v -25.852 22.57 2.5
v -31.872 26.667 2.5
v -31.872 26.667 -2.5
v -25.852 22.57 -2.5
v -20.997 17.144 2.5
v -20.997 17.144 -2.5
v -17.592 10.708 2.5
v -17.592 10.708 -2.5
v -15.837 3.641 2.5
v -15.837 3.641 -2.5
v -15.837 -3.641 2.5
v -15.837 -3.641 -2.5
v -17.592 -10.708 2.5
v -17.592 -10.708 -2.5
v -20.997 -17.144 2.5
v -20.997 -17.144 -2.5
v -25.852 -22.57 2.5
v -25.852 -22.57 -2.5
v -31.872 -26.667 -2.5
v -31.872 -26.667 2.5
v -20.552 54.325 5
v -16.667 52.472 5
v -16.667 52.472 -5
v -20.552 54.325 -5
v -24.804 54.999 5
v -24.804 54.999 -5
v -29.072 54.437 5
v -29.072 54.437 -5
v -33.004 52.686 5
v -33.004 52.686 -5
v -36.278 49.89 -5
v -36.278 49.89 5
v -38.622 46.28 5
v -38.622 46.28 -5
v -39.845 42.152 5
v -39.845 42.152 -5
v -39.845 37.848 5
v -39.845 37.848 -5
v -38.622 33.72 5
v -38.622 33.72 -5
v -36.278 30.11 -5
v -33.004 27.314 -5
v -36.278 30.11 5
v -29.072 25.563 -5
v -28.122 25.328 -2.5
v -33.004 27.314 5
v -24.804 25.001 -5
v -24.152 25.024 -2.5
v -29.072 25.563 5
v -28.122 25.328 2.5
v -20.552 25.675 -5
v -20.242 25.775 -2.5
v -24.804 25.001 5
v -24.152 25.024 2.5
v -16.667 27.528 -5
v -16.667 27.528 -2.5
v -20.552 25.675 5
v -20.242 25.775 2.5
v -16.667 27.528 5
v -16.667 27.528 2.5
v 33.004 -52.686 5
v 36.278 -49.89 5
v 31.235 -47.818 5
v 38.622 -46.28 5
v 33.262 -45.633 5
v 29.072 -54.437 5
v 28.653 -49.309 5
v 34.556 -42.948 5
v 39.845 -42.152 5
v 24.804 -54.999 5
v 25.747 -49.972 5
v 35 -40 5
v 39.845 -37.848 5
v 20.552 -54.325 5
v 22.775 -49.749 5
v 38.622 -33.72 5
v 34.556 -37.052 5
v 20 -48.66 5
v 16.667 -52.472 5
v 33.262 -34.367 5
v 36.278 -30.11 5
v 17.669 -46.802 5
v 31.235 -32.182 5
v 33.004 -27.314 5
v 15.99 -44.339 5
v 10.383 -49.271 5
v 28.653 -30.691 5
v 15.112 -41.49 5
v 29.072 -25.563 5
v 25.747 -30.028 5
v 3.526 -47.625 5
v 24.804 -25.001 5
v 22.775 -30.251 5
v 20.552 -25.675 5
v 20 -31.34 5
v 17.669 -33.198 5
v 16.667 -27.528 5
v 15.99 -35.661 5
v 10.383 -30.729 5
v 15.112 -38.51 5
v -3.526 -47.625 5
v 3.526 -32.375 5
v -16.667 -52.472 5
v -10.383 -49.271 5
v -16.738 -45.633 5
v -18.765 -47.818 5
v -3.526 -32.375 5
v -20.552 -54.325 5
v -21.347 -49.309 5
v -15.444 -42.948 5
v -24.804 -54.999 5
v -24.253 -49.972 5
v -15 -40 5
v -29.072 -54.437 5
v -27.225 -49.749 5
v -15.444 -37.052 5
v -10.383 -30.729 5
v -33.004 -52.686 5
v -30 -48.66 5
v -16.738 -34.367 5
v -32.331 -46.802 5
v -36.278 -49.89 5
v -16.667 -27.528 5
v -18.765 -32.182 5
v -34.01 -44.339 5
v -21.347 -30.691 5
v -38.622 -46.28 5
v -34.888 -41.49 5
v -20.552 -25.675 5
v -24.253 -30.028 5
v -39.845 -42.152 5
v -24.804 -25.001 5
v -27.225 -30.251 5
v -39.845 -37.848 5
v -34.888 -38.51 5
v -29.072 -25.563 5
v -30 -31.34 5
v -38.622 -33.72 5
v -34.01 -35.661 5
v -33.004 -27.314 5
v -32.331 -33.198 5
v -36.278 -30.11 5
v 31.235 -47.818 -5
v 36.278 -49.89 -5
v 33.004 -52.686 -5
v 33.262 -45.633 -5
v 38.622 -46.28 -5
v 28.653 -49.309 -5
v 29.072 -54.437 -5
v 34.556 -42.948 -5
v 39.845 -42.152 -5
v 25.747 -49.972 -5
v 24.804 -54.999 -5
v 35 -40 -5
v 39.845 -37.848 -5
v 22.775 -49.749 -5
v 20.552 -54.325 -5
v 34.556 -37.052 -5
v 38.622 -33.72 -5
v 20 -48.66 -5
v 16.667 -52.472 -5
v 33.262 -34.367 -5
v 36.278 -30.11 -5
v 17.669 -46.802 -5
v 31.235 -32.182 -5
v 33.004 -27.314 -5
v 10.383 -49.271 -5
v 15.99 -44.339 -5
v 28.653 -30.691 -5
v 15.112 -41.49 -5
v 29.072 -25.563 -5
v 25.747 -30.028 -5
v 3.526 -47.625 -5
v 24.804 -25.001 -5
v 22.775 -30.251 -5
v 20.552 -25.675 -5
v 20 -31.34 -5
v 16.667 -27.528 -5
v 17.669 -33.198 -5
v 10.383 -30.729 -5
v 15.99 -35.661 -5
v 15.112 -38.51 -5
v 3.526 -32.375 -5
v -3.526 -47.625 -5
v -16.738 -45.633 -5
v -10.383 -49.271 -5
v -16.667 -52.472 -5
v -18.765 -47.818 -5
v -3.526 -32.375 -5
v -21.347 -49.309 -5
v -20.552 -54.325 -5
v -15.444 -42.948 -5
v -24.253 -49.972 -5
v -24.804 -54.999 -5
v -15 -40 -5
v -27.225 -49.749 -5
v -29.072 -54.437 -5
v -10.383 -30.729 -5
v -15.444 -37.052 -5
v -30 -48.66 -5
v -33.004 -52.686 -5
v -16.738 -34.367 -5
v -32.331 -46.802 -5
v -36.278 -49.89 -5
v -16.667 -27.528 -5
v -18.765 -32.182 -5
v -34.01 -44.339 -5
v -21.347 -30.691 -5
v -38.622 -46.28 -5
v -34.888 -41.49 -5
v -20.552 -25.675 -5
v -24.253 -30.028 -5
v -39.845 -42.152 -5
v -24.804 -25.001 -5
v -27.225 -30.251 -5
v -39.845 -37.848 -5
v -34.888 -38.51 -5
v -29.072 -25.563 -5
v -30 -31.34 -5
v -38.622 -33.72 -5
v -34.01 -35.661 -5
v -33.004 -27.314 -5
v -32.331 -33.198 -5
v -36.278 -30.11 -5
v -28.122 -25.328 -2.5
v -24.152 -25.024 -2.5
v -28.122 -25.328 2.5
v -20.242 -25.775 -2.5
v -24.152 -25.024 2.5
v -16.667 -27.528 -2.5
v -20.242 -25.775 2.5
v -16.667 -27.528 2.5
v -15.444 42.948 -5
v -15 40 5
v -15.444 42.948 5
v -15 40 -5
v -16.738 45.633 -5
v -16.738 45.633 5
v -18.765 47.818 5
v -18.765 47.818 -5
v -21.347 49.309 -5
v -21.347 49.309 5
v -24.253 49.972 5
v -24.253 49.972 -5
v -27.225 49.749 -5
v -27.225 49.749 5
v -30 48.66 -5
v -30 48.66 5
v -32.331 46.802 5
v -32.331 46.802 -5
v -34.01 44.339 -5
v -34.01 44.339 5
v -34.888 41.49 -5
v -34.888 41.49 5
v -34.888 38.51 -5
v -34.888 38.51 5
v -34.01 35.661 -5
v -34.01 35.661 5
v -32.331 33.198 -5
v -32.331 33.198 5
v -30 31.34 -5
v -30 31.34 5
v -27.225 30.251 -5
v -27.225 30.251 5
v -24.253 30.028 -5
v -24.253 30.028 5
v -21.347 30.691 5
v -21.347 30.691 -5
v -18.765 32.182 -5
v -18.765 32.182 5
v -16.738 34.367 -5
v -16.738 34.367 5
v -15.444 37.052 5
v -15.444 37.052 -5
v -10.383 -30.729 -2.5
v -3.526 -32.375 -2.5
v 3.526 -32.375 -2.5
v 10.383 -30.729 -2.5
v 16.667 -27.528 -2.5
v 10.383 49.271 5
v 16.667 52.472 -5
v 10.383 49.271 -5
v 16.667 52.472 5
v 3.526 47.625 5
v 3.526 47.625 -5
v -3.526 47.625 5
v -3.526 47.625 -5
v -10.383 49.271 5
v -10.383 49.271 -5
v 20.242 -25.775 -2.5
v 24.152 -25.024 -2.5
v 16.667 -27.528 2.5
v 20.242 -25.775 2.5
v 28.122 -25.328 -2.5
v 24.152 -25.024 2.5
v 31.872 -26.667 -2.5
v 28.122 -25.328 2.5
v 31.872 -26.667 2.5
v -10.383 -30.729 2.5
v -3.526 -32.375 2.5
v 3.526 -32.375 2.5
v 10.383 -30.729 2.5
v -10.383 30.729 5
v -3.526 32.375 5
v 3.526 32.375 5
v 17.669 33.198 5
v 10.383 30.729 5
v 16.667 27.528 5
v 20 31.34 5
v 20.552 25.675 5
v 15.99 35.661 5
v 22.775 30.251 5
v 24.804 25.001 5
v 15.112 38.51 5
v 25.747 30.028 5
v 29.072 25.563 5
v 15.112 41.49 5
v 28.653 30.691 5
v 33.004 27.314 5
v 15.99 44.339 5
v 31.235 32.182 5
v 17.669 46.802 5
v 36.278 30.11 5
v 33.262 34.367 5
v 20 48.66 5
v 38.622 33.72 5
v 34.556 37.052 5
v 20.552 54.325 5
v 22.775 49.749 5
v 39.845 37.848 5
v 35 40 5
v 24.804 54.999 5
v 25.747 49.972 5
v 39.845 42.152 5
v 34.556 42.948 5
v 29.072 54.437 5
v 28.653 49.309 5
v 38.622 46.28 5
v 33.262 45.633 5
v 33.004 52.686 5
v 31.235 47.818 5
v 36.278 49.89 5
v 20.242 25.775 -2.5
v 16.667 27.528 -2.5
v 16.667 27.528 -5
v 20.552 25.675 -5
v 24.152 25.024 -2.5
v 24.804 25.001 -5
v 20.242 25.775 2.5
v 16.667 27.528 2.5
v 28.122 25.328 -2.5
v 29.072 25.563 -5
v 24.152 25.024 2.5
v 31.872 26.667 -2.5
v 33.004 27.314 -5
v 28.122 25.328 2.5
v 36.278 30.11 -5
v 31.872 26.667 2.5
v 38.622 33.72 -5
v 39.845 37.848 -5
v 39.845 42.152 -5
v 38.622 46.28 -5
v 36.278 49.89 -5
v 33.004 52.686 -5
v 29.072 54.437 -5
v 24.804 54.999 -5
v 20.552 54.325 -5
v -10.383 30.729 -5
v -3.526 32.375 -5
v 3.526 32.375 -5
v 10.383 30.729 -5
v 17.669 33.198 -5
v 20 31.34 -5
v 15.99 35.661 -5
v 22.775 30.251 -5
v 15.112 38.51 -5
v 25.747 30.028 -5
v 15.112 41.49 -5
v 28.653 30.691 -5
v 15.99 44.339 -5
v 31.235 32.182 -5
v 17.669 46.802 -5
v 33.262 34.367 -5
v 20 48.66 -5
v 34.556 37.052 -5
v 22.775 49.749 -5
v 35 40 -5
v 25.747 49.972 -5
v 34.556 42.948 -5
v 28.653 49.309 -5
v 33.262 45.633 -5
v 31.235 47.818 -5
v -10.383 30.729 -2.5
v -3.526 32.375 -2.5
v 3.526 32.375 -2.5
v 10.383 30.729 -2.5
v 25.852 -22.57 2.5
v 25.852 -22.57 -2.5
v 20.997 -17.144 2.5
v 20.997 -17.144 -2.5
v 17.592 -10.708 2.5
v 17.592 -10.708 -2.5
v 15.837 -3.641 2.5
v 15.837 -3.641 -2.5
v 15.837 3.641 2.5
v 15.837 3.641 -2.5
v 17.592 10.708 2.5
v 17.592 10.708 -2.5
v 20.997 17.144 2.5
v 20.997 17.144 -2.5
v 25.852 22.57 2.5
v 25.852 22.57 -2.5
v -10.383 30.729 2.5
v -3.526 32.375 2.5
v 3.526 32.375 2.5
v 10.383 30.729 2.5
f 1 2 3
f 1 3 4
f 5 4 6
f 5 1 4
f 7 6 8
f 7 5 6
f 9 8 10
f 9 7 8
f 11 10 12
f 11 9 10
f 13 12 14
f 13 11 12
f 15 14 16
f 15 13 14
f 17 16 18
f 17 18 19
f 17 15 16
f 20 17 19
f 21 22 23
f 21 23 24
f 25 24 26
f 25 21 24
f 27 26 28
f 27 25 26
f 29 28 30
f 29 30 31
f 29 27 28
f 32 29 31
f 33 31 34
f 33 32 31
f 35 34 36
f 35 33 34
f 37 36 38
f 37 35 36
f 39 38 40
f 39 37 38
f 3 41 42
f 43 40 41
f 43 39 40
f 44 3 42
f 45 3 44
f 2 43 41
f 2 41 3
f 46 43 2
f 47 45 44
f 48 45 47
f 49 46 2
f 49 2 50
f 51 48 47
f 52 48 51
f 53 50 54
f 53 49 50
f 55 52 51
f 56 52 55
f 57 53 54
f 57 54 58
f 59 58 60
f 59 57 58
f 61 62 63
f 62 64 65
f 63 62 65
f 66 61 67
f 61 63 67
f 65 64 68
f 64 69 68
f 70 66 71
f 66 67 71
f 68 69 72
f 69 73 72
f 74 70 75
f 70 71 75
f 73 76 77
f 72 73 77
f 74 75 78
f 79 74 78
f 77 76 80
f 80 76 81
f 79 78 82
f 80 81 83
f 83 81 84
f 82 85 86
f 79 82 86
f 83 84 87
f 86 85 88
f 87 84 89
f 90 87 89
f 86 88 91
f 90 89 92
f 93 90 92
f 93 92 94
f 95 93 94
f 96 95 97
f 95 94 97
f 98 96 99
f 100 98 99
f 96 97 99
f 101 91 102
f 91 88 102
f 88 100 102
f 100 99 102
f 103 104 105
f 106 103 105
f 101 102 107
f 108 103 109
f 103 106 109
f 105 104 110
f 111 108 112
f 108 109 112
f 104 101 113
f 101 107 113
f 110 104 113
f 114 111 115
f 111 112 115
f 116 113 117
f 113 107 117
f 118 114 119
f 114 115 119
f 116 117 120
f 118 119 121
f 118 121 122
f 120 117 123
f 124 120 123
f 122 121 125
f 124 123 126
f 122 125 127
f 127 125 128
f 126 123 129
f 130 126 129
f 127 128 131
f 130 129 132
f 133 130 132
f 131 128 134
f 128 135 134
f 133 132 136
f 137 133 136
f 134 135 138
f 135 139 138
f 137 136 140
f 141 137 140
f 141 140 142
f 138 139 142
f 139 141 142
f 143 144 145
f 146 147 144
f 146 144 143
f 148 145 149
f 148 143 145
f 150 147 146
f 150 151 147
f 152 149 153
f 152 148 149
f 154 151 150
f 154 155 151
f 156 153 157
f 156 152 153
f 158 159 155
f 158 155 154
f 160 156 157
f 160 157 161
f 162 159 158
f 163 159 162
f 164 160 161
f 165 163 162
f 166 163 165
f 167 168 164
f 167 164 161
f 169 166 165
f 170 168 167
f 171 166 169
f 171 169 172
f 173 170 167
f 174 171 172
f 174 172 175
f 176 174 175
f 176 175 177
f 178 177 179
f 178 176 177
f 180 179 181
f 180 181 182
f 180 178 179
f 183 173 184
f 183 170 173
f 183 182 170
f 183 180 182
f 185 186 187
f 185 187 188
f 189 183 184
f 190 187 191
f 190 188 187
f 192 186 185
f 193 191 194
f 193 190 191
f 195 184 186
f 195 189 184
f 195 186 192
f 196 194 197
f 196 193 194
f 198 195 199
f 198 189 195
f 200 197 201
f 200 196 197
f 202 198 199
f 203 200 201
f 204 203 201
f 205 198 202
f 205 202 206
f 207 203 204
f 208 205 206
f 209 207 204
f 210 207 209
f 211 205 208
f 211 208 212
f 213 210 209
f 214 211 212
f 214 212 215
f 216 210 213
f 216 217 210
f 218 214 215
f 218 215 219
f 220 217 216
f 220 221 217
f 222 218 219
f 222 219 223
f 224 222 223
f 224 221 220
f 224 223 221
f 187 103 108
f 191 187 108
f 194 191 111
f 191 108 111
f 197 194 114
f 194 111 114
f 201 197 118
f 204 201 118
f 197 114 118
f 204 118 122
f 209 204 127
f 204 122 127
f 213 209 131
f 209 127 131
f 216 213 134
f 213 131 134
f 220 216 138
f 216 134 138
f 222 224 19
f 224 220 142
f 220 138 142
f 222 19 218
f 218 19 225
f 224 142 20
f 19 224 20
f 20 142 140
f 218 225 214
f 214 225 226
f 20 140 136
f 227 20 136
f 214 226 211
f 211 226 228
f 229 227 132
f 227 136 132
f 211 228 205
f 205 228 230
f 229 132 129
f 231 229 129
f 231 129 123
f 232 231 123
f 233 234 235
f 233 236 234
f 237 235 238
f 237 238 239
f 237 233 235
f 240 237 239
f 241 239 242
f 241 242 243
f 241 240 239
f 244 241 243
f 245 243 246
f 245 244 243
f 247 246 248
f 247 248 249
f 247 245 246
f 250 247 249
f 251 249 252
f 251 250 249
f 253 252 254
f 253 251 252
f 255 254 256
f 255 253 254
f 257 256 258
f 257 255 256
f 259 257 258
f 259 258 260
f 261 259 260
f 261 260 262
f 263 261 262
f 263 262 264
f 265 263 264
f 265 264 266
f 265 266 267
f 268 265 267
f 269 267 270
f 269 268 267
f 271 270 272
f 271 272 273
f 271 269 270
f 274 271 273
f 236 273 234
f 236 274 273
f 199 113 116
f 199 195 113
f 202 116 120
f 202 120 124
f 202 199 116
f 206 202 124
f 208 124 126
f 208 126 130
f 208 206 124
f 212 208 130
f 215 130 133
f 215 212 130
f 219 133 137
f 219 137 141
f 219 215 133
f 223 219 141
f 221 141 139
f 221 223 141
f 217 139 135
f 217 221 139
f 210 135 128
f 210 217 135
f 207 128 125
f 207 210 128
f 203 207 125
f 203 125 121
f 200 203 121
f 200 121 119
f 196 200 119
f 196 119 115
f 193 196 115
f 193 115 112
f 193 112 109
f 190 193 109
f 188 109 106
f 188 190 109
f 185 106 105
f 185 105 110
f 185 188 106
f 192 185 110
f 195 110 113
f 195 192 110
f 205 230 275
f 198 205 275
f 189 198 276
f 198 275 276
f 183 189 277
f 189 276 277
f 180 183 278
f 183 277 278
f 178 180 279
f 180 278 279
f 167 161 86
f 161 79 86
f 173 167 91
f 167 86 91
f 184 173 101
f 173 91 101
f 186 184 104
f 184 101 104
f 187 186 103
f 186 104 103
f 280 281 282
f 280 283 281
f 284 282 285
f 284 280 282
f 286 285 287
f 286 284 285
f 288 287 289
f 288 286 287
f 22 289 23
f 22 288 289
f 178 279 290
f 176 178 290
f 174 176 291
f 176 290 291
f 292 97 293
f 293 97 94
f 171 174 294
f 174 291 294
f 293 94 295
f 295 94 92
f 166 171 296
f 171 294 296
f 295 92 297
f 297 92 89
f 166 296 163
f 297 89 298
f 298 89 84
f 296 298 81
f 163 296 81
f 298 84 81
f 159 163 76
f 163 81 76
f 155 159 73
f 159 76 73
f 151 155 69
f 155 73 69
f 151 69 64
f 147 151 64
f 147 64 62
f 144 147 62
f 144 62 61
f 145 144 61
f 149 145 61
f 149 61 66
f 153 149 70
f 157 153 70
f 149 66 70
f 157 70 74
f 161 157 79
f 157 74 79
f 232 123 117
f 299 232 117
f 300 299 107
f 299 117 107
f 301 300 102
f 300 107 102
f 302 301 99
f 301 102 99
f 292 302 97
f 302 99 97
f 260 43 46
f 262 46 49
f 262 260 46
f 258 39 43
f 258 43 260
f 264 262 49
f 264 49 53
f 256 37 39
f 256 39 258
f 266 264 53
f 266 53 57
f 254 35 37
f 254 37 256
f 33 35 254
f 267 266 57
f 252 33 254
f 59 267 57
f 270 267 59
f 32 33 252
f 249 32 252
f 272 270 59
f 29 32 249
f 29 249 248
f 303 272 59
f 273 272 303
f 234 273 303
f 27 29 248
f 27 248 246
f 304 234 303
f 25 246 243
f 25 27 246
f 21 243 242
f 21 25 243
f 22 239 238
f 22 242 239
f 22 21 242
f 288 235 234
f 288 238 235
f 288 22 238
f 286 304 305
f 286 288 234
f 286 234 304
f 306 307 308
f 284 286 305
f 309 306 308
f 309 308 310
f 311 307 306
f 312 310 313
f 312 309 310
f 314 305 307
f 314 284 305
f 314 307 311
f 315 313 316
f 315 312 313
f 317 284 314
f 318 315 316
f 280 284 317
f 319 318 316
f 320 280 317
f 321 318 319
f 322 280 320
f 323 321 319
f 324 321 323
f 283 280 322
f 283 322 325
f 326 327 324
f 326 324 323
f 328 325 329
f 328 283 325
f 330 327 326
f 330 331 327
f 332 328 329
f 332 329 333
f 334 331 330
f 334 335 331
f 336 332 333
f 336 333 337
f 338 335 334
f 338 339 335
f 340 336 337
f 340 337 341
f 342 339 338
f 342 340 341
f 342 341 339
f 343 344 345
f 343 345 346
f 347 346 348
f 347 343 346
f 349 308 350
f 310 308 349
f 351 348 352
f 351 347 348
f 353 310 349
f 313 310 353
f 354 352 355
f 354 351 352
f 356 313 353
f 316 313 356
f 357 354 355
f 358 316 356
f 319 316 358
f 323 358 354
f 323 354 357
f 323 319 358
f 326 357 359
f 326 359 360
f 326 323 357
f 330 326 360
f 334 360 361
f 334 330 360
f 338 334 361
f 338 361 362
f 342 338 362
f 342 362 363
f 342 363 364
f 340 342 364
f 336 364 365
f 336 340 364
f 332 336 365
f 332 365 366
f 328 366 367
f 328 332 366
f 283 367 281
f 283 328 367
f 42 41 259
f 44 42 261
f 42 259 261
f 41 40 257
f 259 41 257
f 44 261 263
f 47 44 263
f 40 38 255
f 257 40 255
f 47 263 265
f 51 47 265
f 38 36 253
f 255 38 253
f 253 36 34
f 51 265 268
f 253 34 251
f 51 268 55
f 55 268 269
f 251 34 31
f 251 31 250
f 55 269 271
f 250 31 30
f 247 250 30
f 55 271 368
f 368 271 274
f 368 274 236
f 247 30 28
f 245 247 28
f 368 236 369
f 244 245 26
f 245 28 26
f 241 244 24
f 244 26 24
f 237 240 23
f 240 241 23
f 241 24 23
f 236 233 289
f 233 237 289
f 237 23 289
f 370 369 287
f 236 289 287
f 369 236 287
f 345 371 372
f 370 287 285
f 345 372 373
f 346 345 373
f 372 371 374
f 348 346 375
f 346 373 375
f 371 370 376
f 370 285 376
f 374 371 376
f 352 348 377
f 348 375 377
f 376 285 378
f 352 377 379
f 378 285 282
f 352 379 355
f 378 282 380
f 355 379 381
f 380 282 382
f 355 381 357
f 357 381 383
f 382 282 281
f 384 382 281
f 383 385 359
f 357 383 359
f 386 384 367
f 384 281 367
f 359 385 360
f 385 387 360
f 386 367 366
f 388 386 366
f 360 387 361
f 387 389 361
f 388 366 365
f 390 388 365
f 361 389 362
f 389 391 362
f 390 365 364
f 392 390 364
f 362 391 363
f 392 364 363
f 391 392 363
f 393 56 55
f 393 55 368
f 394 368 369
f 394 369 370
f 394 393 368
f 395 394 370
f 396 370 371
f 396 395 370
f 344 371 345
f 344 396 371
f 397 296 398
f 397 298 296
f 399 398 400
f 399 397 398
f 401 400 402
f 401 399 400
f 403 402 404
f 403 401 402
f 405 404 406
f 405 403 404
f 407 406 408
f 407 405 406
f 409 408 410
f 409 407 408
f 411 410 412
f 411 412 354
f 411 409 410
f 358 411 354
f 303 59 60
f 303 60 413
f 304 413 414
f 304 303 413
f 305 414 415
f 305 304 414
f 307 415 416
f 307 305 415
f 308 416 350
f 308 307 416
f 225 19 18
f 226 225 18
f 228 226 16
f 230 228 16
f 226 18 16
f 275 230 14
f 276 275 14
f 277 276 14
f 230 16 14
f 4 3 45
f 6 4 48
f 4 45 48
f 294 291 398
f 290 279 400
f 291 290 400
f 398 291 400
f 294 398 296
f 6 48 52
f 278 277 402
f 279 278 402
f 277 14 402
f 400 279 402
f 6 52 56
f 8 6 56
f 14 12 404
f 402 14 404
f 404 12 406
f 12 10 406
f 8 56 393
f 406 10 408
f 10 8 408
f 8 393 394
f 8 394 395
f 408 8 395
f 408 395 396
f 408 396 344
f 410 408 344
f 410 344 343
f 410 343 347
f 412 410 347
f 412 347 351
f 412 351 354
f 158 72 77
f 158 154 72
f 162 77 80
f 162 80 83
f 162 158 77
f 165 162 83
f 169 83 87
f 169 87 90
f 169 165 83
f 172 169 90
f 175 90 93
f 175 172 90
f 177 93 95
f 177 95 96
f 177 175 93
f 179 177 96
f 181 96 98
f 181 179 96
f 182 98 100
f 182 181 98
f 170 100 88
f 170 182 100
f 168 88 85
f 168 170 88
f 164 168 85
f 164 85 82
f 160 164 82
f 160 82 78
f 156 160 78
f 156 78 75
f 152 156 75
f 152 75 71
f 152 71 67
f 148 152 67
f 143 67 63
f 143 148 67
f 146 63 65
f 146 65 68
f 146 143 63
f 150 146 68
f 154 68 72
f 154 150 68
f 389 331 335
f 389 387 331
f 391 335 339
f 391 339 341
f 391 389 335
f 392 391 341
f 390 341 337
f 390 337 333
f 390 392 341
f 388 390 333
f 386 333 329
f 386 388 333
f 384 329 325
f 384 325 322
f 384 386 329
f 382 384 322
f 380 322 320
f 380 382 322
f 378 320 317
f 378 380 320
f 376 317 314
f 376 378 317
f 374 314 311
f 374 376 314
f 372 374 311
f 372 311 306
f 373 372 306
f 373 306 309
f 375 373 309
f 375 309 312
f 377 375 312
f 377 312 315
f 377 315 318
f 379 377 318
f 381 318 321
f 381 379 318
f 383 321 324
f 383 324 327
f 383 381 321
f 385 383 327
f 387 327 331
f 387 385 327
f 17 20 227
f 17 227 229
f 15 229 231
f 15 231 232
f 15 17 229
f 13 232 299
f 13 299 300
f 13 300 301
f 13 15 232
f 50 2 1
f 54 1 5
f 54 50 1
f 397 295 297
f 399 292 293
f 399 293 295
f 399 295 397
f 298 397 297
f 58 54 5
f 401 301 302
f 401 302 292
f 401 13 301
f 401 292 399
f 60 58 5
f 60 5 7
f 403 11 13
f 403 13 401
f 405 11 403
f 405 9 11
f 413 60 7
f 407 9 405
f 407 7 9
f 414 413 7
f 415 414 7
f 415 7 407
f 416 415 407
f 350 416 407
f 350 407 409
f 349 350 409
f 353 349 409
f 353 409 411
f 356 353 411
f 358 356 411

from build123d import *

# Parameters (mm, degrees)
SKETCH1_R             = 10
BOSS_EXTRUDE1_DEPTH   = 5
BOSS_EXTRUDE1_2_DEPTH = 5
BOSS_EXTRUDE2_DEPTH   = 2.5


with BuildPart() as part:
    # Sketch1 → Boss-Extrude1 (new, symmetric)
    with BuildSketch(Plane.XY):
        with BuildLine():
            ThreePointArc((-16.666666667, 27.527808711), (0, 32.583426132), (16.666666667, 27.527808711))
            ThreePointArc((16.666666667, 27.527808711), (40, 40), (16.666666667, 52.472191289))
            ThreePointArc((16.666666667, 52.472191289), (0, 47.416573868), (-16.666666667, 52.472191289))
            ThreePointArc((-16.666666667, 52.472191289), (-40, 40), (-16.666666667, 27.527808711))
        make_face()
        with Locations((-25, 40)):
            Circle(SKETCH1_R, mode=Mode.SUBTRACT)
        with Locations((25, 40)):
            Circle(SKETCH1_R, mode=Mode.SUBTRACT)
    extrude(amount=BOSS_EXTRUDE1_DEPTH, both=True)



with BuildPart() as body_2:
    # Sketch1 → Boss-Extrude1 2 (new, symmetric)
    with BuildSketch(Plane.XY):
        with BuildLine():
            ThreePointArc((16.666666667, -52.472191289), (40, -40), (16.666666667, -27.527808711))
            ThreePointArc((16.666666667, -27.527808711), (0, -32.583426132), (-16.666666667, -27.527808711))
            ThreePointArc((-16.666666667, -27.527808711), (-40, -40), (-16.666666667, -52.472191289))
            ThreePointArc((-16.666666667, -52.472191289), (0, -47.416573868), (16.666666667, -52.472191289))
        make_face()
        with Locations((-25, -40)):
            Circle(SKETCH1_R, mode=Mode.SUBTRACT)
        with Locations((25, -40)):
            Circle(SKETCH1_R, mode=Mode.SUBTRACT)
    extrude(amount=BOSS_EXTRUDE1_2_DEPTH, both=True)


with BuildPart() as part_1:
    add(part.part)

    add(body_2.part)  # Boss-Extrude2 merges body 2
    # Sketch1<3> → Boss-Extrude2 (add, symmetric)
    with BuildSketch(Plane.XY):
        with BuildLine():
            ThreePointArc((31.871842709, 26.666666667), (24.151837211, 25.023998535), (16.666666667, 27.527808711))
            ThreePointArc((16.666666667, 27.527808711), (0, 32.583426132), (-16.666666667, 27.527808711))
            ThreePointArc((-16.666666667, 27.527808711), (-24.151837211, 25.023998535), (-31.871842709, 26.666666667))
            ThreePointArc((-31.871842709, 26.666666667), (-15.615528128, 0), (-31.871842709, -26.666666667))
            ThreePointArc((-31.871842709, -26.666666667), (-24.151837211, -25.023998535), (-16.666666667, -27.527808711))
            ThreePointArc((-16.666666667, -27.527808711), (0, -32.583426132), (16.666666667, -27.527808711))
            ThreePointArc((16.666666667, -27.527808711), (24.151837211, -25.023998535), (31.871842709, -26.666666667))
            ThreePointArc((31.871842709, -26.666666667), (15.615528128, 0), (31.871842709, 26.666666667))
        make_face()
    extrude(amount=BOSS_EXTRUDE2_DEPTH, both=True)


solid = part_1.part
